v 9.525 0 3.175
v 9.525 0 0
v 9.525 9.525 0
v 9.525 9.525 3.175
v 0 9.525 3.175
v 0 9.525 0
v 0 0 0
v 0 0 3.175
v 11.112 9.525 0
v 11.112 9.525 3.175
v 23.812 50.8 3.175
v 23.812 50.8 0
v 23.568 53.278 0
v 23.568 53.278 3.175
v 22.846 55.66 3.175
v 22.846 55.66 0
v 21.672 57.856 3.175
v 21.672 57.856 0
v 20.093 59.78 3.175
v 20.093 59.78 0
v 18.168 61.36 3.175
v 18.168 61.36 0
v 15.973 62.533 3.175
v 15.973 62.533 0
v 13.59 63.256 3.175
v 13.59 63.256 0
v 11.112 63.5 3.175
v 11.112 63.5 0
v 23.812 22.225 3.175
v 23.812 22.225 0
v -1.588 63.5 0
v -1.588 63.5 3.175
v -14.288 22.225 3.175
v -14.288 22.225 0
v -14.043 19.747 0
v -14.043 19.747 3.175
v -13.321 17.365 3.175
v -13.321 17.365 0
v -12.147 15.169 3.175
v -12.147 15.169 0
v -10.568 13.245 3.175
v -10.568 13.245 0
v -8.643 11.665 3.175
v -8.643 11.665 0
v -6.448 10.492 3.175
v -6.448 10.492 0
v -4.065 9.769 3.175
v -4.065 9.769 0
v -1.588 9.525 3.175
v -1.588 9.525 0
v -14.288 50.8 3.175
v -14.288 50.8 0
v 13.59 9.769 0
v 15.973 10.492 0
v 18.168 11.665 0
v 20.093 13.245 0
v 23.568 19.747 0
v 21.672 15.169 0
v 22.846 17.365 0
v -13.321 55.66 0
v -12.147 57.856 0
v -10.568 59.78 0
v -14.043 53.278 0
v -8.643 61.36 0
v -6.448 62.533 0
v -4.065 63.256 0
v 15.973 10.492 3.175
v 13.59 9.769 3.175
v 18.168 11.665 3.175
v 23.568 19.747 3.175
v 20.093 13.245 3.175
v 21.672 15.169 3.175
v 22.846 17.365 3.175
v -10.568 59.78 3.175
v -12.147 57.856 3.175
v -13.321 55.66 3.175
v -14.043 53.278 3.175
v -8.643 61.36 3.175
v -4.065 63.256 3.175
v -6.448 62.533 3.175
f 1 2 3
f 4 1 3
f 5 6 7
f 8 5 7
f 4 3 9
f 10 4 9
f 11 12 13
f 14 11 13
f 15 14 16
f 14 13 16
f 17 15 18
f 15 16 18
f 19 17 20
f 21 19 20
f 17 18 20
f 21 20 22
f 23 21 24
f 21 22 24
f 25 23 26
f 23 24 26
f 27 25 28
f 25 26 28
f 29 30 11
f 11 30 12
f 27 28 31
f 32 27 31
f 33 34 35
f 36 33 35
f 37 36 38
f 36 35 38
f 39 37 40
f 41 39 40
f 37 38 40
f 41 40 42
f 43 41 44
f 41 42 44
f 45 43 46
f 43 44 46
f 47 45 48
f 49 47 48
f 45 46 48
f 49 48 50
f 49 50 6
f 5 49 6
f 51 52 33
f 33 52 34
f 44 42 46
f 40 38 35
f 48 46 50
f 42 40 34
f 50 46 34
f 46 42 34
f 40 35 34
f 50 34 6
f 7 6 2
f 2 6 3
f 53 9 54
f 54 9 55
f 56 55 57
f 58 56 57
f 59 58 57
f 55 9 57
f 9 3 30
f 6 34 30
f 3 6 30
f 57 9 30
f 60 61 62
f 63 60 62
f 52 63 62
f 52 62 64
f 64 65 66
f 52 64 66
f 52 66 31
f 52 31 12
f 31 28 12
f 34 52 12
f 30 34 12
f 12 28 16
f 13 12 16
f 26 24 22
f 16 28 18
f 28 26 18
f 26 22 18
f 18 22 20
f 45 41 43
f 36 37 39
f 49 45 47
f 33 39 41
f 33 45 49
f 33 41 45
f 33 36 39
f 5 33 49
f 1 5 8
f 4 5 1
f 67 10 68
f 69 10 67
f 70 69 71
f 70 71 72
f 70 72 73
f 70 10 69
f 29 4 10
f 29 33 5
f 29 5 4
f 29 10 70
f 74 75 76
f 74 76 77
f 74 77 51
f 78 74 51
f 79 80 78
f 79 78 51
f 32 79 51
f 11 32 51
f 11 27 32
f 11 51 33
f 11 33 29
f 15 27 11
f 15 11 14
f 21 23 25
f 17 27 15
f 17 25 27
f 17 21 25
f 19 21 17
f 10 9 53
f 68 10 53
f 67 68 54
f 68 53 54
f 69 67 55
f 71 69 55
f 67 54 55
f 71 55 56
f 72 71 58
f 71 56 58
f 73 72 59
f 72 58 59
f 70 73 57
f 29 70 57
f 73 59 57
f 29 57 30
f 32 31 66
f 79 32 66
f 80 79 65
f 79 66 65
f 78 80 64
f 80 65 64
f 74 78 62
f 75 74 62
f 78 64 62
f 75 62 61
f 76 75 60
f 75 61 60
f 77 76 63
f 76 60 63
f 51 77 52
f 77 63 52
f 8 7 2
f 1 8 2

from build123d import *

# Parameters (mm, degrees)
BOSS_EXTRUDE1_DEPTH = 3.175


with BuildPart() as part:
    # Sketch1 → Boss-Extrude1 (new body)
    with BuildSketch(Plane.XY):
        with BuildLine():
            Line((9.525, 9.525), (11.1125, 9.525))
            ThreePointArc((11.1125, 9.525), (20.092756121, 13.244743879), (23.8125, 22.225))
            Line((23.8125, 22.225), (23.8125, 50.8))
            ThreePointArc((23.8125, 50.8), (20.092756121, 59.780256121), (11.1125, 63.5))
            Line((11.1125, 63.5), (-1.5875, 63.5))
            ThreePointArc((-1.5875, 63.5), (-10.567756121, 59.780256121), (-14.2875, 50.8))
            Line((-14.2875, 50.8), (-14.2875, 22.225))
            ThreePointArc((-14.2875, 22.225), (-10.567756121, 13.244743879), (-1.5875, 9.525))
            Line((-1.5875, 9.525), (0, 9.525))
            Line((0, 9.525), (0, 0))
            Line((0, 0), (9.525, 0))
            Line((9.525, 0), (9.525, 9.525))
        make_face()
    extrude(amount=BOSS_EXTRUDE1_DEPTH)


solid = part.part
